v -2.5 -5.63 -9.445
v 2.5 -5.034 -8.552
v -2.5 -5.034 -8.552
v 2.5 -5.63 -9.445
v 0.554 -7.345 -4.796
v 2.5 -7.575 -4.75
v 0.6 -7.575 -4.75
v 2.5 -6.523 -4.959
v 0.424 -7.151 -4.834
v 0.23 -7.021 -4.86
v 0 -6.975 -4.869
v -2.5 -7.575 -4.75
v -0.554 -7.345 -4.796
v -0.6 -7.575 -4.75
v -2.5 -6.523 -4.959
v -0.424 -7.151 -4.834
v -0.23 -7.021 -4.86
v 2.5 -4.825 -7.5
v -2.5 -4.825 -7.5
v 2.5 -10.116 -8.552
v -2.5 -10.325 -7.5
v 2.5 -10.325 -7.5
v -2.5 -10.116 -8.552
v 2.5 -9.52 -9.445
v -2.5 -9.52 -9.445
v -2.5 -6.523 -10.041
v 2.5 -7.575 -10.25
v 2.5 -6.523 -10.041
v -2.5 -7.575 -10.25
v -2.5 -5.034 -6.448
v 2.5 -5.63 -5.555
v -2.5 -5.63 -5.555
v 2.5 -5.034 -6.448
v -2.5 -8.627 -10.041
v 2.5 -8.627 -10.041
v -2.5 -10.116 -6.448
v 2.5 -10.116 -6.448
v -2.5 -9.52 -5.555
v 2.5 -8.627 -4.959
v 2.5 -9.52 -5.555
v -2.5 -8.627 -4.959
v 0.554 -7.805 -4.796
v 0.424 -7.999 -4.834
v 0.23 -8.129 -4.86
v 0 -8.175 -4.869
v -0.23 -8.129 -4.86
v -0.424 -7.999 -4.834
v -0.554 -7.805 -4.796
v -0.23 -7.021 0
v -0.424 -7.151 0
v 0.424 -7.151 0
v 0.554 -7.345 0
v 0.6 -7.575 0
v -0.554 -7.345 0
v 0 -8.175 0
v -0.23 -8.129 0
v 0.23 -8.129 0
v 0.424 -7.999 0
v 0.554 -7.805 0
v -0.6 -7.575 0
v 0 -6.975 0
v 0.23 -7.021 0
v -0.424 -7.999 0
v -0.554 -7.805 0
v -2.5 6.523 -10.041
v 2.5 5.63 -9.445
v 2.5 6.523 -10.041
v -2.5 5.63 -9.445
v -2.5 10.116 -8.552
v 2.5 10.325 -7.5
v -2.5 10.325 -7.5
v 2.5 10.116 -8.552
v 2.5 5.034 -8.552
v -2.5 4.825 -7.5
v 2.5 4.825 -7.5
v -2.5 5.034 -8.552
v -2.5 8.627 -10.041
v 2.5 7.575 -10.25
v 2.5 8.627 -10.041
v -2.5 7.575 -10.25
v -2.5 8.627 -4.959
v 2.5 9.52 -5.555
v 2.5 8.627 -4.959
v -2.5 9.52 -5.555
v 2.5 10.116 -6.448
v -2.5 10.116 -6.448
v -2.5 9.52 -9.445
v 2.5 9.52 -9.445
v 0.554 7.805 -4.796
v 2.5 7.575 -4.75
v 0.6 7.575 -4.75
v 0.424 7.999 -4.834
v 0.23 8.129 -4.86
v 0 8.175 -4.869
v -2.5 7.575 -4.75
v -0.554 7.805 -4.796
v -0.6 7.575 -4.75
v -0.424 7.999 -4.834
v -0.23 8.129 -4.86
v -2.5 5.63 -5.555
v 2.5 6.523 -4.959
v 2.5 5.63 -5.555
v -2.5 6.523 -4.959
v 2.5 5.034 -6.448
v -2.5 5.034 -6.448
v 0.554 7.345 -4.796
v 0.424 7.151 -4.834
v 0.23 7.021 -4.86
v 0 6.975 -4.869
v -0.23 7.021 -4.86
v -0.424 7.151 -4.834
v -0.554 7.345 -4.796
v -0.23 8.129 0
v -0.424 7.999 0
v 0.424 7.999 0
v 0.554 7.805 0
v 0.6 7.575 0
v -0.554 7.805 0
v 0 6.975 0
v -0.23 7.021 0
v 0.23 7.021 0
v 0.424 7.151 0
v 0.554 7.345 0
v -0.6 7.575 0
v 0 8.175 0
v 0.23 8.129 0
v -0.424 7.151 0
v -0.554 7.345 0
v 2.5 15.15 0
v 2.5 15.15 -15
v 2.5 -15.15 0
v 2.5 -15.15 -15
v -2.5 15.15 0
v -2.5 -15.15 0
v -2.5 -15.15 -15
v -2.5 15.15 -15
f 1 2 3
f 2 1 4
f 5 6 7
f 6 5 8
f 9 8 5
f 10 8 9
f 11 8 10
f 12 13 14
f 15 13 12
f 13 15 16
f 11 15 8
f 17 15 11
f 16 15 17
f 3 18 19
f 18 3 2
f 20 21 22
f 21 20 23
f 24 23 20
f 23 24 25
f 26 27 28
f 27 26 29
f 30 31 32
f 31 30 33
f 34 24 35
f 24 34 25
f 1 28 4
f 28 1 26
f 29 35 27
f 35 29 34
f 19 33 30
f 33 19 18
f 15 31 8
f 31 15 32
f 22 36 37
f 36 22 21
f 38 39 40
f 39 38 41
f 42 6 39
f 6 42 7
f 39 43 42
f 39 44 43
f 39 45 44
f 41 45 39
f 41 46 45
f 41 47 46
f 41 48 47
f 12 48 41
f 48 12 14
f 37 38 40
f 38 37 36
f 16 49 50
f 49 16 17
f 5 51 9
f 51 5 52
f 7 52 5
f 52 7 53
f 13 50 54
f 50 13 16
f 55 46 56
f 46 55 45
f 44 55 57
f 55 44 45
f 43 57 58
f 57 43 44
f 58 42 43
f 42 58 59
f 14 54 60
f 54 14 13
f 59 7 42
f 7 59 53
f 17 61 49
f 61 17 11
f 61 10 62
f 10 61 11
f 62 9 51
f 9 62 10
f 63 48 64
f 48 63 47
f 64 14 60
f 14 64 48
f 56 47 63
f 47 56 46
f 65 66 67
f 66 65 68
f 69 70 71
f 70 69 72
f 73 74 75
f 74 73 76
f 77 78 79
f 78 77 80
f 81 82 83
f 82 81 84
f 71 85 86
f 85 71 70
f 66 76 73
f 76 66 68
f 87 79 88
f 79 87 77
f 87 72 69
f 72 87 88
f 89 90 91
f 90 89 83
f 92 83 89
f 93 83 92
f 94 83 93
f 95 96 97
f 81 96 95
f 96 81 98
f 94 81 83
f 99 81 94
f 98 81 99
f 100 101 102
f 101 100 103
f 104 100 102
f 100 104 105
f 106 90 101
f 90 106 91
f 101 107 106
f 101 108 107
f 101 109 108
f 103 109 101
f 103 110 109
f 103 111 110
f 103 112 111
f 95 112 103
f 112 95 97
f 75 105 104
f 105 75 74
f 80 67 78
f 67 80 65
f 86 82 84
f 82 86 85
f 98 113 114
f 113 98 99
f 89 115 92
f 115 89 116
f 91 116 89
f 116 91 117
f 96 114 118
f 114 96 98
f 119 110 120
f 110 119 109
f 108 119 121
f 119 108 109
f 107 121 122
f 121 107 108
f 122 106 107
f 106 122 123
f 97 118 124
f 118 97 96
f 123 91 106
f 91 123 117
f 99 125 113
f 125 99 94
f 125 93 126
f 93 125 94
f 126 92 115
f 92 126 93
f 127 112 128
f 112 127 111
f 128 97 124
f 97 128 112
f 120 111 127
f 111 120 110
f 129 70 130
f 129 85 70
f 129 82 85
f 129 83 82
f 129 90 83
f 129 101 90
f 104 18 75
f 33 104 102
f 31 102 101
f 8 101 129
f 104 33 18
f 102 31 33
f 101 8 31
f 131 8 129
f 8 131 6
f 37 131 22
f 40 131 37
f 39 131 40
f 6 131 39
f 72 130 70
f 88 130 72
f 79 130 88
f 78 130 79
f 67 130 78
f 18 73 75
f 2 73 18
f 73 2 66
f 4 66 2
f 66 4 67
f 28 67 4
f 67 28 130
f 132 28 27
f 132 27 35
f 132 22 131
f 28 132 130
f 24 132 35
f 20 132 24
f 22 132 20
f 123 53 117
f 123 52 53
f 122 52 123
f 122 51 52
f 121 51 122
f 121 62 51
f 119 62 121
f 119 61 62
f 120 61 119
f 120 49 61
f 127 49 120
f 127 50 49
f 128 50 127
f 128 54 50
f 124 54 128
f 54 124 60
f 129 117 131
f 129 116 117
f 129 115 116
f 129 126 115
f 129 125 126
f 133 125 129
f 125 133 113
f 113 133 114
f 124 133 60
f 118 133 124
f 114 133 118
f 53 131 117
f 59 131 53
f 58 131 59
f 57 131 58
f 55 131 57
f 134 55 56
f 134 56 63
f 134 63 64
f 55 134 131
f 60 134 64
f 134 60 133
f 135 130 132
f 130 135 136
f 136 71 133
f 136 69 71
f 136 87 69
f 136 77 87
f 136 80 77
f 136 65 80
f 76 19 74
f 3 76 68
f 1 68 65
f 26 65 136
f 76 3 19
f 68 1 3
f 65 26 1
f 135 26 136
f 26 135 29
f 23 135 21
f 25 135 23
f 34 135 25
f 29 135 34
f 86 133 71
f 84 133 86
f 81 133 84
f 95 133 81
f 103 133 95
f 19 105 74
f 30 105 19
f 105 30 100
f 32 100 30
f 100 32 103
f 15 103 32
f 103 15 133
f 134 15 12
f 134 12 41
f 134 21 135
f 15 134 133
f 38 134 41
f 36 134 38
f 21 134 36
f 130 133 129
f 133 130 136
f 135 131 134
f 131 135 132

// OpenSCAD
module foot(wood_w = 15, wood_t = 5, gap = 0.3)
{
    bighole_diam = 5.5;
    bolthole_diam = 1.2;
    
    translate([0, 0, -wood_w/2]) difference() 
    {
        color([0.75,0.48,0.19, 1.0])
        cube([wood_t, 2*wood_w+gap, wood_w], center = true);

        translate([0, -wood_w/2-gap/4, 0])
        { 
            rotate([0,90,0]) 
            cylinder(h=wood_t+0.5,r=bighole_diam/2,center = true, $fn = 16);

            translate([0, 0, wood_w/4]) 
            cylinder(h=wood_w/2+0.5,r=bolthole_diam/2,center = true, $fn = 16);
        }
        
        translate([0, wood_w/2+gap/4, 0])
        { 
            rotate([0,90,0]) 
            cylinder(h=wood_t+0.5,r=bighole_diam/2,center = true, $fn = 16);

            translate([0, 0, wood_w/4]) 
            cylinder(h=wood_w/2+0.5,r=bolthole_diam/2,center = true, $fn = 16);
        }
    }
}        

foot();
